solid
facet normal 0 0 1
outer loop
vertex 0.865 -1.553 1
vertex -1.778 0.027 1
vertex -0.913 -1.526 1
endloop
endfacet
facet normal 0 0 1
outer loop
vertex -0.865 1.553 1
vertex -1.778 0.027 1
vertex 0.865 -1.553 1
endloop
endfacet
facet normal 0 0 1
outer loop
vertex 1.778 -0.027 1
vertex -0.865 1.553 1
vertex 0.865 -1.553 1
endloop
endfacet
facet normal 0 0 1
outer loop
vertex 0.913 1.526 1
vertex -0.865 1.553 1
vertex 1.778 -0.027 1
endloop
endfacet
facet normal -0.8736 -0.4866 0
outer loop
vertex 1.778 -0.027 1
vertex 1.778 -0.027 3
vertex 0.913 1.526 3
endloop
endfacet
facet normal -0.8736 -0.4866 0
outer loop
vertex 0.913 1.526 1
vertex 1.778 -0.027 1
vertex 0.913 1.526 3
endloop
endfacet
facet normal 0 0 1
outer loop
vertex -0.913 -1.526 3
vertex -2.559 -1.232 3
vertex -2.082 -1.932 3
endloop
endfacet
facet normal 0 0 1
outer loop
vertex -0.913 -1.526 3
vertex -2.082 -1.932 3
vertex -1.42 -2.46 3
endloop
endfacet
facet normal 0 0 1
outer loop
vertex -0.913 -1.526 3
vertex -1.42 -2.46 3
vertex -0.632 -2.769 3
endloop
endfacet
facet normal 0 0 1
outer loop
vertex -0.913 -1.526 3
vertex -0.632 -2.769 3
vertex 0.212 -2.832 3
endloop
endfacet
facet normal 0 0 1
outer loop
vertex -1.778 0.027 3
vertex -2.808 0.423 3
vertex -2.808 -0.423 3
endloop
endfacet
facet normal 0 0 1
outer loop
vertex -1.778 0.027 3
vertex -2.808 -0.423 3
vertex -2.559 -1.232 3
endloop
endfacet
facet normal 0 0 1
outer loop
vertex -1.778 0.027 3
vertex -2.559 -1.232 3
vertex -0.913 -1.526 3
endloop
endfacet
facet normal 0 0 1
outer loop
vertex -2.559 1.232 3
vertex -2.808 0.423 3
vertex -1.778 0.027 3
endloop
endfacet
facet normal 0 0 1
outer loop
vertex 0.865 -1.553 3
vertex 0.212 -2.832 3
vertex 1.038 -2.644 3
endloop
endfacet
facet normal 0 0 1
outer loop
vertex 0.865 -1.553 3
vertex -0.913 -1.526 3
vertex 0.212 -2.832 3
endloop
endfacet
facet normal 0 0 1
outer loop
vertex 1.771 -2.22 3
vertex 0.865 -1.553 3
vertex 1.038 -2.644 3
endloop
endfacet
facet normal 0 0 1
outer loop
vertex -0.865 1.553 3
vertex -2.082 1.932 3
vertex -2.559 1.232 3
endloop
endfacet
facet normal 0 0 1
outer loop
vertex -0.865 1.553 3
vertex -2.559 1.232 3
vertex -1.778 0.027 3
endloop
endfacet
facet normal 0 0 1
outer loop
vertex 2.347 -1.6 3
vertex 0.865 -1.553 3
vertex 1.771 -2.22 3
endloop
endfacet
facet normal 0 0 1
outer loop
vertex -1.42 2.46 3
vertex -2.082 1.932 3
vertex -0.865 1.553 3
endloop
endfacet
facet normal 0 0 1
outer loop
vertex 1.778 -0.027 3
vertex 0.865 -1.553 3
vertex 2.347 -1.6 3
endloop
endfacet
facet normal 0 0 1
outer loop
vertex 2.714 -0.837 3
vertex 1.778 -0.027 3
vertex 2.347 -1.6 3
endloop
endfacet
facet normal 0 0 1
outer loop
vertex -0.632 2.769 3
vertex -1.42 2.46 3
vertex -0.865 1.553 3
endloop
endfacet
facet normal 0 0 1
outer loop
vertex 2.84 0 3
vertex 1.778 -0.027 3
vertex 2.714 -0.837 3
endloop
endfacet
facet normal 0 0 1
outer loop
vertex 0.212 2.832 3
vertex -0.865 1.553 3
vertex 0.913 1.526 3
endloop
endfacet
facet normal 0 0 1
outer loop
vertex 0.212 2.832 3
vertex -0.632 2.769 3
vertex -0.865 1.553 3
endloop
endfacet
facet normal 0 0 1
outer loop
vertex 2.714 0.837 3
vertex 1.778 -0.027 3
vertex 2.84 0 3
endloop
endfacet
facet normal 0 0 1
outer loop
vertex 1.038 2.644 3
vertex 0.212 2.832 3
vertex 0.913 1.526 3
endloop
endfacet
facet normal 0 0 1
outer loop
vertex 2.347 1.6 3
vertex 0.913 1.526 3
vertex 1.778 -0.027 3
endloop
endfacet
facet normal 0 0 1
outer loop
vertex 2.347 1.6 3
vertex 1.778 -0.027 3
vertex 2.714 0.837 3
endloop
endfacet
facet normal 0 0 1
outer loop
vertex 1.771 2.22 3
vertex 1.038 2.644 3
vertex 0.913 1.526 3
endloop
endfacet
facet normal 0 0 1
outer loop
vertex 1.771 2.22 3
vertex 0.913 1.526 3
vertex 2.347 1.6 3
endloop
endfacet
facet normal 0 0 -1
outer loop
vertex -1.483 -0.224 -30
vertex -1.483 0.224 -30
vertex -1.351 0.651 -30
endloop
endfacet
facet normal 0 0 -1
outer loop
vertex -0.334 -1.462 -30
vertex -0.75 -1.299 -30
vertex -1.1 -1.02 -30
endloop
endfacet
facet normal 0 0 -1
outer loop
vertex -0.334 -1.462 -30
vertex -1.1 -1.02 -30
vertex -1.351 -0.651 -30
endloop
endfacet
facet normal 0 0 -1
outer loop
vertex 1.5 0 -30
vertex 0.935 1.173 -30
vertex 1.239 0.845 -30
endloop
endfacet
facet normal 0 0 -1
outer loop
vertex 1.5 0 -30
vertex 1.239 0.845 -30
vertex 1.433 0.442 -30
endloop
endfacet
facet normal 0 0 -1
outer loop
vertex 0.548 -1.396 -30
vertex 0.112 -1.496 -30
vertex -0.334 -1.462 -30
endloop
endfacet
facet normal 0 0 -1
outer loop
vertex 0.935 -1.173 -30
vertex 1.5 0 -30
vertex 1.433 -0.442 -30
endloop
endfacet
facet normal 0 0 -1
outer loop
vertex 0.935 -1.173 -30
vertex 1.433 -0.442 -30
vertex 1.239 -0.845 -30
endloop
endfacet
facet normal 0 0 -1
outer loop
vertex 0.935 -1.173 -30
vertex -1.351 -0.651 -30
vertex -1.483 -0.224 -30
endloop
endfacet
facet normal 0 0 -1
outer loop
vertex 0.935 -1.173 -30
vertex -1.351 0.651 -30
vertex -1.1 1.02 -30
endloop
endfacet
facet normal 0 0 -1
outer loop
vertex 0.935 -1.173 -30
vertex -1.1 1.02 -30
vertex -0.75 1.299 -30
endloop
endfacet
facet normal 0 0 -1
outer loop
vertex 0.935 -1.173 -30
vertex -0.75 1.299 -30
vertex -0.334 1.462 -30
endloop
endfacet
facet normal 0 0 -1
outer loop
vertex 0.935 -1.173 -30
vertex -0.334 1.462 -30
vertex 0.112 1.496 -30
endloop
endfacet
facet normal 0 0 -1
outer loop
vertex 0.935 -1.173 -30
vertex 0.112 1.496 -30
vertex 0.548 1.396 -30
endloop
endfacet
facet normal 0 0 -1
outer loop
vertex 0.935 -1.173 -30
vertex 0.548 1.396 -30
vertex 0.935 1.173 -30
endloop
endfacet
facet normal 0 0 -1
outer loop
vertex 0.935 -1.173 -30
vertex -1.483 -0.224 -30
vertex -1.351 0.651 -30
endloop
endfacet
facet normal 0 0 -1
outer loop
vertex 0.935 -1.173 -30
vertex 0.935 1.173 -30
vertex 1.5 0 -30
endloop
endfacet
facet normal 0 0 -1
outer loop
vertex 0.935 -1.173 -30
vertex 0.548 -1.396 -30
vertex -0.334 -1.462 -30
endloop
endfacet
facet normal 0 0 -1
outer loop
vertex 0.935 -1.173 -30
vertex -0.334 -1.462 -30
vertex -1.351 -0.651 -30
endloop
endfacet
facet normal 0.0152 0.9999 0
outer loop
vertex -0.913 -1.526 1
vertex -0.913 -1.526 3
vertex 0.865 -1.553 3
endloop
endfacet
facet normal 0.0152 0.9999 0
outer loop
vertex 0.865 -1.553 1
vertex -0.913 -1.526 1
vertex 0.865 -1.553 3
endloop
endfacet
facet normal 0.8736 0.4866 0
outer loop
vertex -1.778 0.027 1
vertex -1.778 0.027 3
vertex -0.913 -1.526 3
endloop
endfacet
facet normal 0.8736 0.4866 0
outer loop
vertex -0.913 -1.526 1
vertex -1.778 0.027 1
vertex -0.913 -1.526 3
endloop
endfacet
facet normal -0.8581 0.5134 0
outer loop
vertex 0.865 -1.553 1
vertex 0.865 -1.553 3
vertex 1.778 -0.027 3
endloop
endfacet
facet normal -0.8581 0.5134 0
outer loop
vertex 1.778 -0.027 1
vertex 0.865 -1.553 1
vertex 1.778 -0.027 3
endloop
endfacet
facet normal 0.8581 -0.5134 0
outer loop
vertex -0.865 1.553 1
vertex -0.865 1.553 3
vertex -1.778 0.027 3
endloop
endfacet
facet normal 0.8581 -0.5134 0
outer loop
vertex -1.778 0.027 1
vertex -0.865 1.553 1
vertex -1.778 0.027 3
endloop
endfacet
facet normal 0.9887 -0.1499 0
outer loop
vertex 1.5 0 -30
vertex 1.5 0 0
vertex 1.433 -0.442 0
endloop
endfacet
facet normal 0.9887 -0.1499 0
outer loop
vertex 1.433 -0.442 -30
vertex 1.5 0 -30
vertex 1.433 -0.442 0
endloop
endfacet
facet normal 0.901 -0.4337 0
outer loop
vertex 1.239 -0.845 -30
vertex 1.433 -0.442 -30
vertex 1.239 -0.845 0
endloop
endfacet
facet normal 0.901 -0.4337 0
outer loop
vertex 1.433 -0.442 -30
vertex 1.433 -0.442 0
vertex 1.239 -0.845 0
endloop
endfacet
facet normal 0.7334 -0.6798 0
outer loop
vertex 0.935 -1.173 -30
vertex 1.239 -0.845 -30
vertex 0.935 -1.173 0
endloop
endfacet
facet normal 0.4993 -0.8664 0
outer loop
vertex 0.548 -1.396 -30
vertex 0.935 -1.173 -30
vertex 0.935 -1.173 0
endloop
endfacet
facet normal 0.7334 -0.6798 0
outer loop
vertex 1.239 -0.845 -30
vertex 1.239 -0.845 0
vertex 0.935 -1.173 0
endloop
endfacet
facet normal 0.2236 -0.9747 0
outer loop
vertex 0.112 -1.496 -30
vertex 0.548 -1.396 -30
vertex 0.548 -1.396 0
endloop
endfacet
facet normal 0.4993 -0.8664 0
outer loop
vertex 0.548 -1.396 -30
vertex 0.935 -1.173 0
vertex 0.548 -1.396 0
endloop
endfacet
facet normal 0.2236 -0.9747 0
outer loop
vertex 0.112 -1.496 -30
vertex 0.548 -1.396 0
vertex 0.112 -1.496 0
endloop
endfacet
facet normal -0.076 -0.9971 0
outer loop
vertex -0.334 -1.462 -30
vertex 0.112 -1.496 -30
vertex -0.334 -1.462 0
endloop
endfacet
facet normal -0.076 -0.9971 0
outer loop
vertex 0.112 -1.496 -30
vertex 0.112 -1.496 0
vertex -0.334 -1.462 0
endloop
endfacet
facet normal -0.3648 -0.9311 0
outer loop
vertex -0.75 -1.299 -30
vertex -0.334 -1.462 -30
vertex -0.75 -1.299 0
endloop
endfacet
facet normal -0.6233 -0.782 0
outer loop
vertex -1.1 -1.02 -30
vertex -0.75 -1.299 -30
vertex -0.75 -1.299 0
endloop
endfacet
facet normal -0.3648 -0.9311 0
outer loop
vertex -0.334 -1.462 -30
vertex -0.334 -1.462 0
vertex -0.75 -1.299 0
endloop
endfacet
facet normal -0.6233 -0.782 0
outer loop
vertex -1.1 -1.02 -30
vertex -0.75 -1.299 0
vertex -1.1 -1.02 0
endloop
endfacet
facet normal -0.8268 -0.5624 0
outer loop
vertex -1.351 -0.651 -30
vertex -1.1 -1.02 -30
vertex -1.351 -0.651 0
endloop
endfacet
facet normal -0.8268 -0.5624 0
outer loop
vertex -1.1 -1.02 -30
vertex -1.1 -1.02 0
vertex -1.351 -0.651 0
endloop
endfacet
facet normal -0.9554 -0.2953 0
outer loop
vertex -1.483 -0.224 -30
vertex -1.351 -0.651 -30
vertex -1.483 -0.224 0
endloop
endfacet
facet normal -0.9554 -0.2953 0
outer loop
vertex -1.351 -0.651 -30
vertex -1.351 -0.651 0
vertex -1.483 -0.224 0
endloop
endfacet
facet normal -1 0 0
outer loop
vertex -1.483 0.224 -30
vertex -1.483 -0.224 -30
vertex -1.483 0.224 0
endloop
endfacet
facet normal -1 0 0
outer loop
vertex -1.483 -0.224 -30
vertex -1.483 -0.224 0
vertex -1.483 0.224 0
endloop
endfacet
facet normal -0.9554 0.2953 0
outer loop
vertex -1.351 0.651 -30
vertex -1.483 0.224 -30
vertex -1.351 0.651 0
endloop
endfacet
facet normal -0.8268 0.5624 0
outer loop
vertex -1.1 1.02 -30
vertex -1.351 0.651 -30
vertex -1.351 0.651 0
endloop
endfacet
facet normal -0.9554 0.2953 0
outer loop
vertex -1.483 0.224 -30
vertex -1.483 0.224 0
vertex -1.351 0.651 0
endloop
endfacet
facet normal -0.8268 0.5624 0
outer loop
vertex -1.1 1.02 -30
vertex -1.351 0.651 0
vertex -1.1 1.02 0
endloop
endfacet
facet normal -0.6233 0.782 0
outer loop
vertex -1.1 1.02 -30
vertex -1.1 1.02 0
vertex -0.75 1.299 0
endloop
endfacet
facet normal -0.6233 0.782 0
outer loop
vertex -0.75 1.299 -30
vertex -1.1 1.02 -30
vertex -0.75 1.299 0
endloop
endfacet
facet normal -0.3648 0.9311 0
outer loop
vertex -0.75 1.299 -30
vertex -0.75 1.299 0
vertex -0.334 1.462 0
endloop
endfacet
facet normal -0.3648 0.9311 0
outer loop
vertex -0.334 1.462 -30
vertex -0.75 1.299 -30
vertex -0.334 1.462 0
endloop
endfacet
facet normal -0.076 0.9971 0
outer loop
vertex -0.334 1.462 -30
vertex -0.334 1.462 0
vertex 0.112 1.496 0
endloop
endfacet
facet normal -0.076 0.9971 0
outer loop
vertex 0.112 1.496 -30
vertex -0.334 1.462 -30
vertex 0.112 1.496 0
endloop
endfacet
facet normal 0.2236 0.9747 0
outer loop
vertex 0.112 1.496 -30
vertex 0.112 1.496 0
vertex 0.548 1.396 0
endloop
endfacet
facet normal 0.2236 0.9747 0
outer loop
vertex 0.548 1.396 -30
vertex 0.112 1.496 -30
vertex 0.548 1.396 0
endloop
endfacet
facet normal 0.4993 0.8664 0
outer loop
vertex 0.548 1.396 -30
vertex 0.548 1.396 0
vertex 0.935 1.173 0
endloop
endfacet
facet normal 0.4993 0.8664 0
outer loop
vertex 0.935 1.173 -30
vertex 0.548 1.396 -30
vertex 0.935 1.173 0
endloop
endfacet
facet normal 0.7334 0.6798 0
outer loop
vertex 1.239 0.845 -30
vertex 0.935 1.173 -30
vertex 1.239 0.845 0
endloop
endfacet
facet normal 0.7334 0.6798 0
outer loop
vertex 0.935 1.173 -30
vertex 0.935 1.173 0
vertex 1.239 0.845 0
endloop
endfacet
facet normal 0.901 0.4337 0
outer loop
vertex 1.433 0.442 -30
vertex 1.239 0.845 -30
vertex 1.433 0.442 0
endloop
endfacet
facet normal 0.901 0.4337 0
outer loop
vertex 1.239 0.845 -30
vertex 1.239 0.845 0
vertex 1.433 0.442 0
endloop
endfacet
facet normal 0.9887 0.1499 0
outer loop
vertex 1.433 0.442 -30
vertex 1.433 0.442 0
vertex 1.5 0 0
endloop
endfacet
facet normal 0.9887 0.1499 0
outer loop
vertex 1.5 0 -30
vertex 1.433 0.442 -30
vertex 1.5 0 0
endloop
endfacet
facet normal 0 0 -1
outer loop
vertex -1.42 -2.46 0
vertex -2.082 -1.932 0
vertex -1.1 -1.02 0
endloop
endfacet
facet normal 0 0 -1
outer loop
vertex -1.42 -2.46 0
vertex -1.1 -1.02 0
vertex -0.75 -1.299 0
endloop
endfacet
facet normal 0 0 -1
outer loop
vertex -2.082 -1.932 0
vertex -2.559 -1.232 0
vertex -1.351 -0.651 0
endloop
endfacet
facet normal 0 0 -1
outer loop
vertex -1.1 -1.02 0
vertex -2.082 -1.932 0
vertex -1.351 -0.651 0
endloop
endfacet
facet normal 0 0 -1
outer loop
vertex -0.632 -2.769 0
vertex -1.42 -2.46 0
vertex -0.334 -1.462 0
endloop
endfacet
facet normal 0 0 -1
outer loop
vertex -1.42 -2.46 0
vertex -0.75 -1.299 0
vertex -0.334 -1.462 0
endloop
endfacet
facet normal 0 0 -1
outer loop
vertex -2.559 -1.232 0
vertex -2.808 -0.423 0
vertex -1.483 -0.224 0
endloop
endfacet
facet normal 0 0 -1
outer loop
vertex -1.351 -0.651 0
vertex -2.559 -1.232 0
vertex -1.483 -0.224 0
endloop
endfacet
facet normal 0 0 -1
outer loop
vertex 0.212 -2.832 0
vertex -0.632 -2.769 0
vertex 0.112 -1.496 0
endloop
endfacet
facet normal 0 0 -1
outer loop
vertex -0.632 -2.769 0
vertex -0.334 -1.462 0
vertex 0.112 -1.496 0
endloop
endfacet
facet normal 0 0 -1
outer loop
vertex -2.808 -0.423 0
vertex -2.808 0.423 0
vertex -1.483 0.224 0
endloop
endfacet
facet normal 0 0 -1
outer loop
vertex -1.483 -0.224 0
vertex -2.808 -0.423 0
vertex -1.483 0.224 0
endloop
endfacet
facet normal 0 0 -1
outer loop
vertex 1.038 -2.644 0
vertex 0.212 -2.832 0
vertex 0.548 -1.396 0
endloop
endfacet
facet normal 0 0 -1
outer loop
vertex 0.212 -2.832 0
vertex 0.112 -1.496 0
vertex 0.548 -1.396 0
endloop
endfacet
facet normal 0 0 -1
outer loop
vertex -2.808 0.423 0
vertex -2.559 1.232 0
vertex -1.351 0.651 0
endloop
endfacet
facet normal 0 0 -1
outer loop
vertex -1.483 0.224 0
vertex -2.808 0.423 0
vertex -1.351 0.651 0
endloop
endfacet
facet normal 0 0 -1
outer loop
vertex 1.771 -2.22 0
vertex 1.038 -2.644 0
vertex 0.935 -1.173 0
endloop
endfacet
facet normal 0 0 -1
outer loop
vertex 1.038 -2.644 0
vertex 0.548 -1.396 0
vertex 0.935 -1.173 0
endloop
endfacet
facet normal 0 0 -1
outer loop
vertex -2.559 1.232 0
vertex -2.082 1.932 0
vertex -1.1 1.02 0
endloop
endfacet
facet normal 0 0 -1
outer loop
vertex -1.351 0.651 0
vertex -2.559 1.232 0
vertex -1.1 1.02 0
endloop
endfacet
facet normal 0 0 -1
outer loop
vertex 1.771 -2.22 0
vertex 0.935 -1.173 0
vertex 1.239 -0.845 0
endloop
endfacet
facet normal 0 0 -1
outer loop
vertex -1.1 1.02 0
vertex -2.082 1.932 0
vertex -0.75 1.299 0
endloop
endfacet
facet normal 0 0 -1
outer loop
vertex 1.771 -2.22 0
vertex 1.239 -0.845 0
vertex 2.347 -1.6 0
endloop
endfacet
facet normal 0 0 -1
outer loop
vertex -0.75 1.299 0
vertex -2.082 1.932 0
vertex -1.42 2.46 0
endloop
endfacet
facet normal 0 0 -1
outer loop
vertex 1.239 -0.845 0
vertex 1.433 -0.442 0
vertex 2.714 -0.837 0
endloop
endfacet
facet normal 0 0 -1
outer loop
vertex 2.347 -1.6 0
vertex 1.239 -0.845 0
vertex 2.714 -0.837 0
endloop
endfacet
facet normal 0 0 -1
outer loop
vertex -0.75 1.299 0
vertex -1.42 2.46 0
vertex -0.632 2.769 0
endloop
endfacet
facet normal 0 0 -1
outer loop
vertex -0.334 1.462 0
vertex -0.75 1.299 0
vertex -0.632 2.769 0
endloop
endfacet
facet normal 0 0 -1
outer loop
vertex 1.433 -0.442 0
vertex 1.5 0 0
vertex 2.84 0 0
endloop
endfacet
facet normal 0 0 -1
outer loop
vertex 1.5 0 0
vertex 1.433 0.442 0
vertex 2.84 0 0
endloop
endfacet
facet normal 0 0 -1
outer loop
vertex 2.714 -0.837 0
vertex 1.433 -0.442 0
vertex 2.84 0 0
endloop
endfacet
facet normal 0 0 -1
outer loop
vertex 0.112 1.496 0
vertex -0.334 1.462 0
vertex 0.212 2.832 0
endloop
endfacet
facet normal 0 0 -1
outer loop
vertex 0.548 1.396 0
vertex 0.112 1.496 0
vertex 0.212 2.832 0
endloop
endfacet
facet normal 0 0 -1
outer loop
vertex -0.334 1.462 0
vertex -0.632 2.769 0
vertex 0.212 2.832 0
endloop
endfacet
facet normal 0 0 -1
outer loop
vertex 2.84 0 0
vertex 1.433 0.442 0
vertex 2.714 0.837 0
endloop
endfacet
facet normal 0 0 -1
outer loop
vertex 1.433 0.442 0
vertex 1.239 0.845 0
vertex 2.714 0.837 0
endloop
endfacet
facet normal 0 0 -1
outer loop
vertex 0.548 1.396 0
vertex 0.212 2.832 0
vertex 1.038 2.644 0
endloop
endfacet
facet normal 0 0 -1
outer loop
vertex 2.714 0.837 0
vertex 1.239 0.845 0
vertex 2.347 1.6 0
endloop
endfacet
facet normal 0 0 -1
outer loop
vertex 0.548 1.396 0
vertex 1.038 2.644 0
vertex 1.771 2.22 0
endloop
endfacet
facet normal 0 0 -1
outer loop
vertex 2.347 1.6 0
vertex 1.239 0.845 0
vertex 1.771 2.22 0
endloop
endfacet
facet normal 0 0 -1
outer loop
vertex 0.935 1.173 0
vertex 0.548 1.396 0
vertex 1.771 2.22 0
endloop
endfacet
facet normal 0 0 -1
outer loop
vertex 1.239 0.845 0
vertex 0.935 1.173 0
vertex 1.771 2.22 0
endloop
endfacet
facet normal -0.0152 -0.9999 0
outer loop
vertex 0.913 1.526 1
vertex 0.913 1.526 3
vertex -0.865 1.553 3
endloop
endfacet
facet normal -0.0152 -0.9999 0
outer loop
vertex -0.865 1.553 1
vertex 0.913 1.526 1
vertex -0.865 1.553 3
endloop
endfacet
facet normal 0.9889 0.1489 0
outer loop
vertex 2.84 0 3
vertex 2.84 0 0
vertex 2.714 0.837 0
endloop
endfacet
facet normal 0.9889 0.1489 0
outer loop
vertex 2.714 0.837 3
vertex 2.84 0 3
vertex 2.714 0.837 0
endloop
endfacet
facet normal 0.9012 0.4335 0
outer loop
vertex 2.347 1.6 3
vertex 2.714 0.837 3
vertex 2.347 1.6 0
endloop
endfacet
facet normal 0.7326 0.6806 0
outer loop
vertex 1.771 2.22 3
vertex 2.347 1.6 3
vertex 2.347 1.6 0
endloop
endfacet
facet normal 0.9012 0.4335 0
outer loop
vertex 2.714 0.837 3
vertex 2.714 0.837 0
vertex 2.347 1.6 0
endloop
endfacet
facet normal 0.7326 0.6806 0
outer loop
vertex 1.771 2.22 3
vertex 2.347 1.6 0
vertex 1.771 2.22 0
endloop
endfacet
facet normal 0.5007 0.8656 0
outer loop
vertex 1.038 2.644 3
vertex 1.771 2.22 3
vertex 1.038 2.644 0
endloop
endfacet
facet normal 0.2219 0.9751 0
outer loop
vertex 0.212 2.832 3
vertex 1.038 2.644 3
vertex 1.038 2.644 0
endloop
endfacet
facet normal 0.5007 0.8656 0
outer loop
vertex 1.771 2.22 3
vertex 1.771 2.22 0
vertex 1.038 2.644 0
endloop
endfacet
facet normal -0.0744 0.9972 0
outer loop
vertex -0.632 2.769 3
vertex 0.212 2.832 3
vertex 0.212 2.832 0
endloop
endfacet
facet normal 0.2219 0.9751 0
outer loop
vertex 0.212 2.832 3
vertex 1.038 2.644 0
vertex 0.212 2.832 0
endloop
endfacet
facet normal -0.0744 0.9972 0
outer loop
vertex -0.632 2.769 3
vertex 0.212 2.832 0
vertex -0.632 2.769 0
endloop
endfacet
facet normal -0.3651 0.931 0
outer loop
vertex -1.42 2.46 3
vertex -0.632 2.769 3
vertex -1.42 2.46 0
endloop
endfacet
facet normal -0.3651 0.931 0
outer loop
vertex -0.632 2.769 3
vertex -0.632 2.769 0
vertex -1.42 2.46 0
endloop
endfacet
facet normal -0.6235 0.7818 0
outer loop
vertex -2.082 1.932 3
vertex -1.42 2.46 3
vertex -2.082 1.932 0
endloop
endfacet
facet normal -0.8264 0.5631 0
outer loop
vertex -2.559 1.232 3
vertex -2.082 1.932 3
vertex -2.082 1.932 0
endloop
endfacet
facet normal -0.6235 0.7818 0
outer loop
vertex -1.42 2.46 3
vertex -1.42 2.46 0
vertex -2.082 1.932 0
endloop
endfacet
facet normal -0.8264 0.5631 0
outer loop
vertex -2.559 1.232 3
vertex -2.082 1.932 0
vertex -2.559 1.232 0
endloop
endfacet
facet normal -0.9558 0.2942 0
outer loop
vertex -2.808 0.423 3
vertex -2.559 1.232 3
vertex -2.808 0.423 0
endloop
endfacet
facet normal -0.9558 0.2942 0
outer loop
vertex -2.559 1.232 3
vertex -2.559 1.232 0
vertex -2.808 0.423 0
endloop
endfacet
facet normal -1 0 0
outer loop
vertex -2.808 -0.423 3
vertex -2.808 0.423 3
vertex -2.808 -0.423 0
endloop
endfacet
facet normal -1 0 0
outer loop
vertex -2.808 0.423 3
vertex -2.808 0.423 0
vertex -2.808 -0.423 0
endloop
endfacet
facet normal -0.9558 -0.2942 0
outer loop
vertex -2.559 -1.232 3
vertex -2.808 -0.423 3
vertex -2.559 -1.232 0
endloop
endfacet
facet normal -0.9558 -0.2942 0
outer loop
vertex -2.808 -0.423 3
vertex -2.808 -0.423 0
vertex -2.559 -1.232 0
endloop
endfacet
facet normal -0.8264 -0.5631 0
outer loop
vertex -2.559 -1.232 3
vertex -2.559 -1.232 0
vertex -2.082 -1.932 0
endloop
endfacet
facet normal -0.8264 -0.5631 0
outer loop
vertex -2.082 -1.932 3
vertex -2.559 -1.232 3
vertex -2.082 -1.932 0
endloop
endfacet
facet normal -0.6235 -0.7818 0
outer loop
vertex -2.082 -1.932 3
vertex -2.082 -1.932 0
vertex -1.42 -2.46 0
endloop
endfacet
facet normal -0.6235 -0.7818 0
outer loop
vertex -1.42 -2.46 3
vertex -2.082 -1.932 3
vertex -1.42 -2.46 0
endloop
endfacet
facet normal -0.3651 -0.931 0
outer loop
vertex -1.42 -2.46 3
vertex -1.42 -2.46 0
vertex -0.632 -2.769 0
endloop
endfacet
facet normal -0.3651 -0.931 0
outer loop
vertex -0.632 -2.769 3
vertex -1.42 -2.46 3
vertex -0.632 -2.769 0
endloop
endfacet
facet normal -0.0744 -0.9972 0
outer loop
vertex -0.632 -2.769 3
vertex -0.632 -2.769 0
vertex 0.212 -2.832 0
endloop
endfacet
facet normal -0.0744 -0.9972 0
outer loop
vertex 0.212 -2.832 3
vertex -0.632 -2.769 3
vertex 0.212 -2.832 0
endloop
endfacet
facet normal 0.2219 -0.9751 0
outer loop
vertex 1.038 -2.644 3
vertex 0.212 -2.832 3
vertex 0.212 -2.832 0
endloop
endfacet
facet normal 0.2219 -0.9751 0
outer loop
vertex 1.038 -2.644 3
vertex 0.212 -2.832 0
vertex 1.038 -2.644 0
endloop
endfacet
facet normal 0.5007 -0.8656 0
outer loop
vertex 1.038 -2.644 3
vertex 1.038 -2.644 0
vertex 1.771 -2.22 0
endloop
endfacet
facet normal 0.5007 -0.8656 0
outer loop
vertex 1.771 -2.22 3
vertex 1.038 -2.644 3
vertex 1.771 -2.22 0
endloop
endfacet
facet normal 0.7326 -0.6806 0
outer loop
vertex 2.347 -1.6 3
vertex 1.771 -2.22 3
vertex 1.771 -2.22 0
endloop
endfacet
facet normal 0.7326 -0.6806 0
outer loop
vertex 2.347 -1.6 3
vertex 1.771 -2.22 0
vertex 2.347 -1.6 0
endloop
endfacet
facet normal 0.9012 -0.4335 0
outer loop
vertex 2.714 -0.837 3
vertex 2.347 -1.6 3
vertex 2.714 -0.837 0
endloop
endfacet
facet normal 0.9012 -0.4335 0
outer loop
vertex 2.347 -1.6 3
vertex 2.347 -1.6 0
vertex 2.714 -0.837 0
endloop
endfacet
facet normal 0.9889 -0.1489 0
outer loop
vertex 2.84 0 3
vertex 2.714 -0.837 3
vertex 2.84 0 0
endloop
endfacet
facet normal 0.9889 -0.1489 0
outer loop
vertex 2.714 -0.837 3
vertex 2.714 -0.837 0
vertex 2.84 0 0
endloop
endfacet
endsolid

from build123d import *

# Parameters (mm, degrees)
SKETCH_1_R          = 2.84
EXTRUDE_1_DEPTH     = 3
SKETCH_2_R          = 1.5
EXTRUDE_2_DEPTH     = 30
CUT_EXTRUDE_1_DEPTH = 2


with BuildPart() as part:
    # 草图1 → 凸台-拉伸1 (new body)
    with BuildSketch(Plane.XY):
        Circle(SKETCH_1_R)
    extrude(amount=EXTRUDE_1_DEPTH)

    # 草图2 → 凸台-拉伸2 (add)
    with BuildSketch(Plane(origin=(0, 0, 0), x_dir=(-1, 0, 0), z_dir=(0, 0, -1))):
        with Locations(Location((0, 0, 0), (0, 0, 180))):
            Circle(SKETCH_2_R)
    extrude(amount=EXTRUDE_2_DEPTH)

    # 草图3 → 切除-拉伸1 (cut)
    with BuildSketch(Plane.XY.offset(3)):
        Polygon((0.912581429, 1.526213769), (-0.865449181, 1.553425585), (-1.77803061, 0.027211816), (-0.912581429, -1.526213769), (0.865449181, -1.553425585), (1.77803061, -0.027211816), align=None)
    extrude(amount=-CUT_EXTRUDE_1_DEPTH, mode=Mode.SUBTRACT)


solid = part.part
